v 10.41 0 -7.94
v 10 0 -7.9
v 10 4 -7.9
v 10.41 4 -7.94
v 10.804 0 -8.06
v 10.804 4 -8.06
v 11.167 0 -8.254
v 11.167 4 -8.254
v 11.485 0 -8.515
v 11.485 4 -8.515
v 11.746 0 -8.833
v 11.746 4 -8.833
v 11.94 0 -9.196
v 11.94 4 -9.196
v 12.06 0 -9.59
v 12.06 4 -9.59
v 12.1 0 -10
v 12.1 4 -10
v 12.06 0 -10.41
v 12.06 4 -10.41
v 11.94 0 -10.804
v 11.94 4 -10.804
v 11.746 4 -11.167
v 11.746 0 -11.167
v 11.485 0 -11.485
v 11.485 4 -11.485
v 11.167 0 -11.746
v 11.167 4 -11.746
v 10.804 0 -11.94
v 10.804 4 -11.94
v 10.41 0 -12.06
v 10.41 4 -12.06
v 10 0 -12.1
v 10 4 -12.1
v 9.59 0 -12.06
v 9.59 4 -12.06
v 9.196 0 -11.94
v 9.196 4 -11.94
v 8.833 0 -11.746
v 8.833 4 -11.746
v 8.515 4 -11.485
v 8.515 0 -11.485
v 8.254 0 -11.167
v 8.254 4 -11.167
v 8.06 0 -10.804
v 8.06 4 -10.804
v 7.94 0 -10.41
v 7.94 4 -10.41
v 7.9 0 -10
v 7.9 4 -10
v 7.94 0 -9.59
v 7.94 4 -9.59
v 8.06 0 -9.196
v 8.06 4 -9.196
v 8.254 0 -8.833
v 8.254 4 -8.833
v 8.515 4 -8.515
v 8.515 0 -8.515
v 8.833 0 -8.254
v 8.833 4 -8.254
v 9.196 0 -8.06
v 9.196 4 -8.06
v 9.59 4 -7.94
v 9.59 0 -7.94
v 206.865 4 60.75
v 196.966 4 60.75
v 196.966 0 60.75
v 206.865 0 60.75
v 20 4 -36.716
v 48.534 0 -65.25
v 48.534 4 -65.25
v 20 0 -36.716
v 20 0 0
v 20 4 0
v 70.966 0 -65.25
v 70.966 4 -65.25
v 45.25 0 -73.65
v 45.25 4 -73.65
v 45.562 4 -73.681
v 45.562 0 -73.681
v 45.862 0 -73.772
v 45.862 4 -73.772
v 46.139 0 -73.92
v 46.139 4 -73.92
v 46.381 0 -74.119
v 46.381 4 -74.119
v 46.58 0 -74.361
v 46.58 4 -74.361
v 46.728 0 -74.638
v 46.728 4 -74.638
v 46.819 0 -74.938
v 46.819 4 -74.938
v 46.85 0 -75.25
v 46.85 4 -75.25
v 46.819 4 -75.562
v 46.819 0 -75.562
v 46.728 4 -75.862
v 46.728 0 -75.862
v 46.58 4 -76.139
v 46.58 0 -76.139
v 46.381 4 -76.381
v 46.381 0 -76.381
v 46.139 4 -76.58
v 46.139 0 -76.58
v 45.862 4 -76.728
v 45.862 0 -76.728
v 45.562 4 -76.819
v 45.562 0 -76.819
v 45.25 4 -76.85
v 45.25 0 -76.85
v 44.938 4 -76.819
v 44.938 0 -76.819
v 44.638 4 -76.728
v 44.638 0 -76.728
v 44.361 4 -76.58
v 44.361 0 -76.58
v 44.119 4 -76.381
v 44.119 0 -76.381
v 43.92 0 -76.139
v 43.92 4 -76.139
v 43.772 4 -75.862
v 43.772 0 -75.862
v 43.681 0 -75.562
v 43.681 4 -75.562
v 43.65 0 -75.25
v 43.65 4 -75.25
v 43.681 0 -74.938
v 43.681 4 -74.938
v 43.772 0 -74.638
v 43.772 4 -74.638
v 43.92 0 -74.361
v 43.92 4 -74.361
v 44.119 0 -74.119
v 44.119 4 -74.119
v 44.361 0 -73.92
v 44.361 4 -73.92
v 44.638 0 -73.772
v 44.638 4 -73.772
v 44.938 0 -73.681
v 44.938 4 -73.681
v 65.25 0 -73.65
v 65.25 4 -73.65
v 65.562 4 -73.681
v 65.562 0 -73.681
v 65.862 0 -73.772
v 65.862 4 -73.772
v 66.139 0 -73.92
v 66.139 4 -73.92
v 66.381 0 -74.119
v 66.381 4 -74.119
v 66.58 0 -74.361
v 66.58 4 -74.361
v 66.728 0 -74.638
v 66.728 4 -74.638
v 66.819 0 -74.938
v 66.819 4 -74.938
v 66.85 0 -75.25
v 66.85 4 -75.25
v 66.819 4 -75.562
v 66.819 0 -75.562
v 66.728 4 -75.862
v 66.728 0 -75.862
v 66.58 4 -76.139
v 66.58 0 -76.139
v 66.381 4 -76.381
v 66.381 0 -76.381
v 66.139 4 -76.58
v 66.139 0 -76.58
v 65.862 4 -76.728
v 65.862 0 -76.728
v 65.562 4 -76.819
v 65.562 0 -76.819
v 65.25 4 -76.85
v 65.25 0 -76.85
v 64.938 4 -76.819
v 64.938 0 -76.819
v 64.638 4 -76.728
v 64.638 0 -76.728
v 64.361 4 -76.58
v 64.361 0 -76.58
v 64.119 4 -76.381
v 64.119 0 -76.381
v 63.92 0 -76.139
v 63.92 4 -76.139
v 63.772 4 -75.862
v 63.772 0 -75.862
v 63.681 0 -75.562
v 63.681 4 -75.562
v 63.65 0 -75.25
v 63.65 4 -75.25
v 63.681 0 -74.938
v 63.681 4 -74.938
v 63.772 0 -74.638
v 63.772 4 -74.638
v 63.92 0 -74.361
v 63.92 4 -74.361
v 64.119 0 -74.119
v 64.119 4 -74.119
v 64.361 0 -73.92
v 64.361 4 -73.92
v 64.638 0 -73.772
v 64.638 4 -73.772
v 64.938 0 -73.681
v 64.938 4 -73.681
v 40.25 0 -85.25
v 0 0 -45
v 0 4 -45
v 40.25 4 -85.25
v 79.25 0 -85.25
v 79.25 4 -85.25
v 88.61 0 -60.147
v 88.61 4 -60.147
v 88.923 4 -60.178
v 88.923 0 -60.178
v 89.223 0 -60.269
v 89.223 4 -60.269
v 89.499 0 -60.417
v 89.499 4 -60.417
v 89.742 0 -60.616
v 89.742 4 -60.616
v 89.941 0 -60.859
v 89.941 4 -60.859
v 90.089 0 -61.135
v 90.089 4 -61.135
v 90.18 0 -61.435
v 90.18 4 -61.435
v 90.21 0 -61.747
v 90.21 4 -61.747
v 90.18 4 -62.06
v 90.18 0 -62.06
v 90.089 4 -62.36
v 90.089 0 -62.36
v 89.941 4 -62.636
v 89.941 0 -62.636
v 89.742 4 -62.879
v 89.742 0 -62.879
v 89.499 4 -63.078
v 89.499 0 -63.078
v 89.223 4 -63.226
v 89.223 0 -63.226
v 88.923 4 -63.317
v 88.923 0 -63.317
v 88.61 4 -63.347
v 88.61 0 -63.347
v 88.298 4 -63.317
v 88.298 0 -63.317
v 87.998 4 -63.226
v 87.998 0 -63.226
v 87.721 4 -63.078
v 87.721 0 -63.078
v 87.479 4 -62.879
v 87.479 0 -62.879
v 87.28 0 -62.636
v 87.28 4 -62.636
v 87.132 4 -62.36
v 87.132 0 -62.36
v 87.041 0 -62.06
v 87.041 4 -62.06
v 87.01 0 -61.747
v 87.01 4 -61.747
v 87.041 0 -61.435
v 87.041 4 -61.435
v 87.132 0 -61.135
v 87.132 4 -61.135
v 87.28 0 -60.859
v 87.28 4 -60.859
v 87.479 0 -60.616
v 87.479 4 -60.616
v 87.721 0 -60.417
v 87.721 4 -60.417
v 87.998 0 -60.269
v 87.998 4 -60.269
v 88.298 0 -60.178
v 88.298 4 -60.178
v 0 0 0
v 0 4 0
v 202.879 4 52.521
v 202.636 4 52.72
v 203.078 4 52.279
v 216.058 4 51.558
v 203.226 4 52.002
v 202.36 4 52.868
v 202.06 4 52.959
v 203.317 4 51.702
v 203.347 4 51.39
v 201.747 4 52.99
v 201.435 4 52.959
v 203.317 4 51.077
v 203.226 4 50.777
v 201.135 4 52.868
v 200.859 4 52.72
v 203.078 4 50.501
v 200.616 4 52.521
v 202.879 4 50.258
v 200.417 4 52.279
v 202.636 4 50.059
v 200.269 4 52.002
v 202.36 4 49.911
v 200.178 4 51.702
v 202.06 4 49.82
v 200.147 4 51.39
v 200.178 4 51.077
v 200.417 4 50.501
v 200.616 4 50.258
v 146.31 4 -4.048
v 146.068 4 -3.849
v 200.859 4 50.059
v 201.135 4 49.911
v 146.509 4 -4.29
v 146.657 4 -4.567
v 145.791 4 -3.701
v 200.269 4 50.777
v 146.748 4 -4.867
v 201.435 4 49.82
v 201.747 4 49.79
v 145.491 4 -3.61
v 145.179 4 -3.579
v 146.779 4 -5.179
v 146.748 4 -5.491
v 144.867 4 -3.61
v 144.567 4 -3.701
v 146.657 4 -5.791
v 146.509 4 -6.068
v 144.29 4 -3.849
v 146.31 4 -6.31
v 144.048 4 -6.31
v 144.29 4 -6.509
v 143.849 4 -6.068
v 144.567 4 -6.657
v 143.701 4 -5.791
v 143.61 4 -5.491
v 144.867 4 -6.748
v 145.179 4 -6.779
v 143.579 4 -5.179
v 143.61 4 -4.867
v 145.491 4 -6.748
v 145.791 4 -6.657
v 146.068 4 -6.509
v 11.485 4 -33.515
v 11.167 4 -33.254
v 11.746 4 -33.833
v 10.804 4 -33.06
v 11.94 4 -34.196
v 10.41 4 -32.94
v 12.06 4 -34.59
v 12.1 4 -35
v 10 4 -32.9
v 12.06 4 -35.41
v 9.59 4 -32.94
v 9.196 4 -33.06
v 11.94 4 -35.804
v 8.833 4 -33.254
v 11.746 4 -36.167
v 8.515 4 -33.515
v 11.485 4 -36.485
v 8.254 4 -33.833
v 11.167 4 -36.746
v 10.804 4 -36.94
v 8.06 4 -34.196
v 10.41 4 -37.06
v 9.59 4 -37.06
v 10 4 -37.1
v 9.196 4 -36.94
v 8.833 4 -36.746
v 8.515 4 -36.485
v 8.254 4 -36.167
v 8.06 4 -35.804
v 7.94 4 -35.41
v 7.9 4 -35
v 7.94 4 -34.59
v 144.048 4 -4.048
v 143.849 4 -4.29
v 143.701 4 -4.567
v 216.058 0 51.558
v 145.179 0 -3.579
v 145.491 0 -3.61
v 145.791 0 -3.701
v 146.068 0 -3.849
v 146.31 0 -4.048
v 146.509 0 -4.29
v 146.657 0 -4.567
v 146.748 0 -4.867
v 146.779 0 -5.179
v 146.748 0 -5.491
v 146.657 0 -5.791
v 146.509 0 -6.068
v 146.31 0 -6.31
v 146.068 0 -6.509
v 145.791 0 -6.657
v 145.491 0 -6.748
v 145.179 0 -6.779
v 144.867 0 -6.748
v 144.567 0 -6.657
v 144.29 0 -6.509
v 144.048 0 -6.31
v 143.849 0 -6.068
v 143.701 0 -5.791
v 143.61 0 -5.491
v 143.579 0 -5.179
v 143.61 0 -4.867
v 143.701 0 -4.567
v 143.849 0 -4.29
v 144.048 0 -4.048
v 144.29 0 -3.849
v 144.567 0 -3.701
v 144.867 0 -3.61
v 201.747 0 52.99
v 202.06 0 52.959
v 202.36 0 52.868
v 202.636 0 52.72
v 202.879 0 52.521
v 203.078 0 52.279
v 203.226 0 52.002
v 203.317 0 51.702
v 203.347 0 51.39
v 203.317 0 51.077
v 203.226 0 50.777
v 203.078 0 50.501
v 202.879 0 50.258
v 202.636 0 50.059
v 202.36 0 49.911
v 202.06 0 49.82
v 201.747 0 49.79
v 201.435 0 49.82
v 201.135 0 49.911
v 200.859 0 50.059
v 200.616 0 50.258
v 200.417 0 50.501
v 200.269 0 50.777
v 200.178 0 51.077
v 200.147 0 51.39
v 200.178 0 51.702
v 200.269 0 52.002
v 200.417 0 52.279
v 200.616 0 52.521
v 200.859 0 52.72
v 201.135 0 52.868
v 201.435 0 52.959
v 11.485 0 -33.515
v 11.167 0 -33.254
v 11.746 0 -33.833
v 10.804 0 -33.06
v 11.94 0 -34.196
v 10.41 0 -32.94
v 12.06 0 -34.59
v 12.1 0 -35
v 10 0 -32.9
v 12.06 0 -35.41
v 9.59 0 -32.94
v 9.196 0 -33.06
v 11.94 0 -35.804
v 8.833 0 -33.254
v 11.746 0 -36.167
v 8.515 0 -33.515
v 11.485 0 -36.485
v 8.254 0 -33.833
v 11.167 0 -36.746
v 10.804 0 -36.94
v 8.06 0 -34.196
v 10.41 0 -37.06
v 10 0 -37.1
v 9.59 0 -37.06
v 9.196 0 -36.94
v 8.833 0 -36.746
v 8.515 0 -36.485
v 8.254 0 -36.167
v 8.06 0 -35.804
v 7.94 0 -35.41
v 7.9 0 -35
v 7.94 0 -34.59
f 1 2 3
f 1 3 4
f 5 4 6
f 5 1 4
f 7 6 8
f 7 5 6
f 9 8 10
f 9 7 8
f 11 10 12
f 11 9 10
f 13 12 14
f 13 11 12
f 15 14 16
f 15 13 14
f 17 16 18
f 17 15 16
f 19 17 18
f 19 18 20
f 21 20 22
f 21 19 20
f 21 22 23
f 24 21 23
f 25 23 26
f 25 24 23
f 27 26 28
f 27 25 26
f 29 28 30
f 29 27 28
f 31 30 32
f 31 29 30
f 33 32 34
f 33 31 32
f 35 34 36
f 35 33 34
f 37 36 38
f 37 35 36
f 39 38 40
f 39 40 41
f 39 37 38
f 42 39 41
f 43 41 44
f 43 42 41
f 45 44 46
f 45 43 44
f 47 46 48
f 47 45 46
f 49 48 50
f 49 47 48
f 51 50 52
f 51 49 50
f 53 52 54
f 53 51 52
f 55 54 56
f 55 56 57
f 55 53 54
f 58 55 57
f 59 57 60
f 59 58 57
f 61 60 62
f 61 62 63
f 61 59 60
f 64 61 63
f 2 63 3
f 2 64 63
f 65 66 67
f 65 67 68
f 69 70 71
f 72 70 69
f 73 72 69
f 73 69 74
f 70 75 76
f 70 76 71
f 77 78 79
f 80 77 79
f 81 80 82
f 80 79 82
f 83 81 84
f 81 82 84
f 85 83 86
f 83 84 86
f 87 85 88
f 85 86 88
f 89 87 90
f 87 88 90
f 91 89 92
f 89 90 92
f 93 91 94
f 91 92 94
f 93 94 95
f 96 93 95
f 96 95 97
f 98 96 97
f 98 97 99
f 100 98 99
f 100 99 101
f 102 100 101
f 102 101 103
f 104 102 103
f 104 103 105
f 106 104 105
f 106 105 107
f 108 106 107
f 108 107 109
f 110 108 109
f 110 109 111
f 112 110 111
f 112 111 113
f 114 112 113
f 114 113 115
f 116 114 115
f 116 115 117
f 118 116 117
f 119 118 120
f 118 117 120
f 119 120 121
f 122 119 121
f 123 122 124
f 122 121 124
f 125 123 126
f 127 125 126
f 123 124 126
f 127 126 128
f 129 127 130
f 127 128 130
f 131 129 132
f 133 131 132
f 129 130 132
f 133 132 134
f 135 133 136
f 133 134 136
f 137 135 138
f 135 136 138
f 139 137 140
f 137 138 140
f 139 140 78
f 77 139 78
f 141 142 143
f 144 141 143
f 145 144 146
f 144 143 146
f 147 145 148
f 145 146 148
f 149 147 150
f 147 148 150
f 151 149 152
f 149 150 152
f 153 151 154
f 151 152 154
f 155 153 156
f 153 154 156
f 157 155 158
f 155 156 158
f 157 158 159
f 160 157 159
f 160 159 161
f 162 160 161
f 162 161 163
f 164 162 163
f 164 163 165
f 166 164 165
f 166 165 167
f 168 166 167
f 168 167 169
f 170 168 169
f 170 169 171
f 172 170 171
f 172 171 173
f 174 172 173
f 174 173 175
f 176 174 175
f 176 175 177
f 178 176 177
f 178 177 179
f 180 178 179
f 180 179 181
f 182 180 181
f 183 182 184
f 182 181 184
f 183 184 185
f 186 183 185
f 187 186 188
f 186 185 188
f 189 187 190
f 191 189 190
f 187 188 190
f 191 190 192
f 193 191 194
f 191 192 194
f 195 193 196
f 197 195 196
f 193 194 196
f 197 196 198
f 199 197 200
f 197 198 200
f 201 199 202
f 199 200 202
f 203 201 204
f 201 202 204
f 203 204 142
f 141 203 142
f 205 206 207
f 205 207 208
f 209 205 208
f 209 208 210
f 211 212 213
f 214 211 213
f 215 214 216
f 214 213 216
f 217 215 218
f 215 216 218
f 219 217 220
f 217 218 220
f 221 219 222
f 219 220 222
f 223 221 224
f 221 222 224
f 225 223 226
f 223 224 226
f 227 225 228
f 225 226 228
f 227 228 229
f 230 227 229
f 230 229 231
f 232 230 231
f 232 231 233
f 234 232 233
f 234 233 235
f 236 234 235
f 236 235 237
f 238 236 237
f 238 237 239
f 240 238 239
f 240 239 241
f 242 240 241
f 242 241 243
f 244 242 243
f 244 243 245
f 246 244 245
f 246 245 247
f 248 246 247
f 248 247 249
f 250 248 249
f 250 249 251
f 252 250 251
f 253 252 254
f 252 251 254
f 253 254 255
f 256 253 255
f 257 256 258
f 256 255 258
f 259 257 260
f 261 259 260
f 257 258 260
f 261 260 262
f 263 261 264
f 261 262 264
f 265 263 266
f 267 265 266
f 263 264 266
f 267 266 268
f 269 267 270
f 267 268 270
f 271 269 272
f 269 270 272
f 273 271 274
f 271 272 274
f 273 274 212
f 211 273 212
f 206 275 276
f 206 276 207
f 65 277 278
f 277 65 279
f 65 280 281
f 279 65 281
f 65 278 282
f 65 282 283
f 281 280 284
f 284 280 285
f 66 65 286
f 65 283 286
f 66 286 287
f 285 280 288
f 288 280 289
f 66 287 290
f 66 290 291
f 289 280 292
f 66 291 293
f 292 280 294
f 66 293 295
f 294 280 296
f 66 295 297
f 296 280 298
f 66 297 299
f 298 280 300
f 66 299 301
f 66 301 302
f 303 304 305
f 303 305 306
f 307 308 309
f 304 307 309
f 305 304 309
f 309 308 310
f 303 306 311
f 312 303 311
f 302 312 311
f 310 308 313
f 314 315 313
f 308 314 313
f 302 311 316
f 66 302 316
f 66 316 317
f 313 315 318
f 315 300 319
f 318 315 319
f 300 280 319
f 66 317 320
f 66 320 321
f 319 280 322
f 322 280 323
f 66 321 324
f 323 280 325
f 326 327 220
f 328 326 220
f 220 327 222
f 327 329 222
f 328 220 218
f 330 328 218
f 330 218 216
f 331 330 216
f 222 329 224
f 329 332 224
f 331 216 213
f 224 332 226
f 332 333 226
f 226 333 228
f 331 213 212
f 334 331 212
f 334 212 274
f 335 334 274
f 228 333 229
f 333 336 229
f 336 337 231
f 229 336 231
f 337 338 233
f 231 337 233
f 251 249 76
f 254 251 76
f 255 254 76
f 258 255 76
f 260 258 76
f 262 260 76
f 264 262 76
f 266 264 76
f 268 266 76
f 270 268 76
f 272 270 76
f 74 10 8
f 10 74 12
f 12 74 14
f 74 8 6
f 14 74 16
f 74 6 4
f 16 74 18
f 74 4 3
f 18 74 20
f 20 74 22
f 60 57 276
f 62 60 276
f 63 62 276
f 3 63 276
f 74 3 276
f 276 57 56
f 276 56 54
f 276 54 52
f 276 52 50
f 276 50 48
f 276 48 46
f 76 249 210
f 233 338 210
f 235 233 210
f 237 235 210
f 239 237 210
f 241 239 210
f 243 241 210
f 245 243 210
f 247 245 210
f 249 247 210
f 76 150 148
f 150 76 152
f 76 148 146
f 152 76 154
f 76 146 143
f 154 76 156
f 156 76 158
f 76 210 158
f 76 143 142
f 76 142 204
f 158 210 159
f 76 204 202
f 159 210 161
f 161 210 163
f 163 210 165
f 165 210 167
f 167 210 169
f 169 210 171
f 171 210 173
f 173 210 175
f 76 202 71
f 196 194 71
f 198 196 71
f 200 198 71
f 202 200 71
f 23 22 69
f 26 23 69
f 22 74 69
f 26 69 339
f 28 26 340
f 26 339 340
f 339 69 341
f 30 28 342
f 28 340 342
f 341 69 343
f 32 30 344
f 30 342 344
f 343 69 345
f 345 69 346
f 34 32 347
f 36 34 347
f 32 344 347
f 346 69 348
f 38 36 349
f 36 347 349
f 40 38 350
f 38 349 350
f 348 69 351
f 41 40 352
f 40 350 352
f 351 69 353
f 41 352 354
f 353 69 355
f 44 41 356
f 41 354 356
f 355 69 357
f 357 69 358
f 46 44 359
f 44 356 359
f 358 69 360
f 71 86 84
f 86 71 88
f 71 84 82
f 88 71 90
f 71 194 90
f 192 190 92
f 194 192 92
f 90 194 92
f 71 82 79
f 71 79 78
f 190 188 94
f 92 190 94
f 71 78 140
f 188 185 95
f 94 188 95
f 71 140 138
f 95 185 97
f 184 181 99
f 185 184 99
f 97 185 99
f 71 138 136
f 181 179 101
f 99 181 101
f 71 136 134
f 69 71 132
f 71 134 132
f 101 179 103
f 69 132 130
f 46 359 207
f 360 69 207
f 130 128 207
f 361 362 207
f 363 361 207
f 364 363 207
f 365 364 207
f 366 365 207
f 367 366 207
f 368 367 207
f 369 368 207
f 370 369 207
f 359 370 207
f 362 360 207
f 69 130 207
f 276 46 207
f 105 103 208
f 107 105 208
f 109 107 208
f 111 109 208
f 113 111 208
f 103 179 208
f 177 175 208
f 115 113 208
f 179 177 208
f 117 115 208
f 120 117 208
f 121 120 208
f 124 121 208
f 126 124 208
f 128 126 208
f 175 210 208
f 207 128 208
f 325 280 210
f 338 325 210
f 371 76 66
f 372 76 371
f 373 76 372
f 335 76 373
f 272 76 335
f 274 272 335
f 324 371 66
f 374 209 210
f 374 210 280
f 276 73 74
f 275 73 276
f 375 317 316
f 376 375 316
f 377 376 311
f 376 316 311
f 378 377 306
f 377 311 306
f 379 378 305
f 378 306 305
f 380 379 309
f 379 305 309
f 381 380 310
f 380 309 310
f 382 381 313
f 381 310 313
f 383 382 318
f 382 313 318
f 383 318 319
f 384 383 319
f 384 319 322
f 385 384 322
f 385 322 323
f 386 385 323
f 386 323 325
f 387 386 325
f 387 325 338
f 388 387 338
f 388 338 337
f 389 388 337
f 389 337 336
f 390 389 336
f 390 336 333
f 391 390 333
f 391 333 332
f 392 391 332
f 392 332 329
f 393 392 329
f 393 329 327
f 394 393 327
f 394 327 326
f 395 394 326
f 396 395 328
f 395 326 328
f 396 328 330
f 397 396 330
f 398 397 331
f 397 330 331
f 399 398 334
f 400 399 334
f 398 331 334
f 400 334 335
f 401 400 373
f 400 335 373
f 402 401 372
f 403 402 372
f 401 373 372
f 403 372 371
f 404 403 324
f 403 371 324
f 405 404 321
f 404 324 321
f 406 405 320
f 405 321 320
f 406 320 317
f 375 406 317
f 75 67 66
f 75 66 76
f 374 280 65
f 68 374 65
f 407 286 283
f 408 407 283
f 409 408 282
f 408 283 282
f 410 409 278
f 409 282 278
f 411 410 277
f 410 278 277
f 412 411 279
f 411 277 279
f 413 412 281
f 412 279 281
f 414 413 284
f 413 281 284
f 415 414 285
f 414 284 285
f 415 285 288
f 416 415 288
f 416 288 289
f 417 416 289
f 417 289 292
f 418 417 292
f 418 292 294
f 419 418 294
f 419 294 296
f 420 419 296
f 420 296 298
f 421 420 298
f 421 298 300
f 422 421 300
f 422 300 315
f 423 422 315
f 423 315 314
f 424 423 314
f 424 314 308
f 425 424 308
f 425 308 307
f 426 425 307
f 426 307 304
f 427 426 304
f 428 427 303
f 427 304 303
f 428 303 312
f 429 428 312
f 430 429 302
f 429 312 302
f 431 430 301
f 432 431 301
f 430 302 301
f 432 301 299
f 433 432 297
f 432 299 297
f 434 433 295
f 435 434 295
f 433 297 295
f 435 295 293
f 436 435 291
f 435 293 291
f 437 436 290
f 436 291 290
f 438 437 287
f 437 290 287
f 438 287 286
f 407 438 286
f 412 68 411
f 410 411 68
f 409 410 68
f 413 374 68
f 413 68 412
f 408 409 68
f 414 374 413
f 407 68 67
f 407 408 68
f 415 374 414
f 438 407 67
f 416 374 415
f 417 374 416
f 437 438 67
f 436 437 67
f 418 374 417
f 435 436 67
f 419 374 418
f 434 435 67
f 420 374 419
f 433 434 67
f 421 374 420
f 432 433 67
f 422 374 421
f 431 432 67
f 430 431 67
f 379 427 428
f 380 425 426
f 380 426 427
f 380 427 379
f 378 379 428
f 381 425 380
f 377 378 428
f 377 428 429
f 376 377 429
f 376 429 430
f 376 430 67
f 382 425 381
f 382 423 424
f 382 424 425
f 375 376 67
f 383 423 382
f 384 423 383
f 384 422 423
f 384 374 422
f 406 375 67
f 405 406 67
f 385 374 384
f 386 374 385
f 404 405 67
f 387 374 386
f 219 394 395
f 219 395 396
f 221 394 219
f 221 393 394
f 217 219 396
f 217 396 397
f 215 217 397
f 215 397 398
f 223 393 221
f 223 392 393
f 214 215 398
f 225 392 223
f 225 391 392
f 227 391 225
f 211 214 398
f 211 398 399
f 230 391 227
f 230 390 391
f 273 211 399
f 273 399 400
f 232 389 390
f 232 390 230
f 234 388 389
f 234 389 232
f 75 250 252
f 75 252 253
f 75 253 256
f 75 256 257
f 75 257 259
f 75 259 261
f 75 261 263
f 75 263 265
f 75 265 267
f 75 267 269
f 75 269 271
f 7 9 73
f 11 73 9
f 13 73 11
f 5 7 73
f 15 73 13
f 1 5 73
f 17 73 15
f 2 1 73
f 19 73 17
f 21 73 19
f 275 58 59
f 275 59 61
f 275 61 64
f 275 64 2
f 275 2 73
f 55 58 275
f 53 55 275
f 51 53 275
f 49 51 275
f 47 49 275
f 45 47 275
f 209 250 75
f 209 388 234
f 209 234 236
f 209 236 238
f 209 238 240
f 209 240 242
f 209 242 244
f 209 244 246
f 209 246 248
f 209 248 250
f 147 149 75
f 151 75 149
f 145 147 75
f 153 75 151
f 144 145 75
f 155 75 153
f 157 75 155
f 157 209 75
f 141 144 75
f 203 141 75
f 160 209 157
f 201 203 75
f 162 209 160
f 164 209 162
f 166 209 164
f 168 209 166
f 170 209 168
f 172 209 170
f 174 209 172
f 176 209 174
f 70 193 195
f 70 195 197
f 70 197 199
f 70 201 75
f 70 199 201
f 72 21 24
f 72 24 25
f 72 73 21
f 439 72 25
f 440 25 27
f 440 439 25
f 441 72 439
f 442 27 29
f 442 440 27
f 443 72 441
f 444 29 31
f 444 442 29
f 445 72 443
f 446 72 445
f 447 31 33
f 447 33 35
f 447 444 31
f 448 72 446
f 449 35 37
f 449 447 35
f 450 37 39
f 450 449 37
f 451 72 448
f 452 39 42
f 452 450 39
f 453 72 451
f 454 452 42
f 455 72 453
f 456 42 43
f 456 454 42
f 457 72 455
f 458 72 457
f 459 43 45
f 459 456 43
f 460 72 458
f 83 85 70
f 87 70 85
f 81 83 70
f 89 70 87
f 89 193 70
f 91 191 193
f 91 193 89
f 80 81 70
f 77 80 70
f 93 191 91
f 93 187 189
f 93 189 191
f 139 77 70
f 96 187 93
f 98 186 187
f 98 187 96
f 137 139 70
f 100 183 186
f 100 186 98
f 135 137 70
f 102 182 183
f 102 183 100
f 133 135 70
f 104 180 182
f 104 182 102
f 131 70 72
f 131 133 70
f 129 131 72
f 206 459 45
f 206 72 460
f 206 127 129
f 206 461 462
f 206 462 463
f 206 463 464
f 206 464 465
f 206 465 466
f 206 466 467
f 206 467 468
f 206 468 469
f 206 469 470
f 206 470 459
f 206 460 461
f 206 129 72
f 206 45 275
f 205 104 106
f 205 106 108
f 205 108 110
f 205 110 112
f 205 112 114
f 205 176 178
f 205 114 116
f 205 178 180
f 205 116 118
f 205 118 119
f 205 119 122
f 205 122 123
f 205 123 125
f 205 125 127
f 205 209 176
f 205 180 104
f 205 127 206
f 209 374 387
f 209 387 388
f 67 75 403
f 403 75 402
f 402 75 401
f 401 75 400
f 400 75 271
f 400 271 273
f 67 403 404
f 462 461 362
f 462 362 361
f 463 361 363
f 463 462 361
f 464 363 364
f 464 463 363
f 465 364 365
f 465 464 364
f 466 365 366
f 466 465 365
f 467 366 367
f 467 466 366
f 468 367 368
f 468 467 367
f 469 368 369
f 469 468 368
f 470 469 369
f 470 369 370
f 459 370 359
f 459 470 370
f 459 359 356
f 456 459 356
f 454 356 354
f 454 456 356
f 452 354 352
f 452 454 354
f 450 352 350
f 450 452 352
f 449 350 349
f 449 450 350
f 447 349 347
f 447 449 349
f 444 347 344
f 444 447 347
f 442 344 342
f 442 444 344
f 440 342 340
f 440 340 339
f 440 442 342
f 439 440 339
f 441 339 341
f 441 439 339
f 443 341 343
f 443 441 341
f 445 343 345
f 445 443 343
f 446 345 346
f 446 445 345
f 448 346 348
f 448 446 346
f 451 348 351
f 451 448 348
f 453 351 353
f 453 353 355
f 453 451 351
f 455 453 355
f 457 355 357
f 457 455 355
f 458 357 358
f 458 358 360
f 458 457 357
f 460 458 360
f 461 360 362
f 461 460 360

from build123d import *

# Parameters (mm, degrees)
SKETCH_1_R          = 2.1
EXTRUDE_1_DEPTH     = 4
CUT_EXTRUDE_1_DEPTH = 10
SKETCH_3_R          = 1.6
CUT_EXTRUDE_2_DEPTH = 50
CUT_EXTRUDE_3_DEPTH = 50
SKETCH_5_R          = 1.6
CUT_EXTRUDE_4_DEPTH = 50


with BuildPart() as part:
    # 草图1 → 凸台-拉伸1 (new body)
    with BuildSketch(Plane(origin=(0, 0, 0), x_dir=(1, 0, 0), z_dir=(0, 1, 0))):
        Polygon((20, 0), (0, 0), (0, 45), (40.25, 85.25), (79.25, 85.25), (225.25, -60.75), (225.25, -99.75), (185, -140), (140, -140), (140, -120), (176.715728753, -120), (205.25, -91.465728753), (205.25, -69.034271247), (70.965728753, 65.25), (48.534271247, 65.25), (20, 36.715728753), align=None)
        with Locations(Location((10, 10, 0), (0, 0, 270))):
            Circle(SKETCH_1_R, mode=Mode.SUBTRACT)
        with Locations(Location((10, 35, 0), (0, 0, 90))):
            Circle(SKETCH_1_R, mode=Mode.SUBTRACT)
        with Locations(Location((175, -130, 0), (0, 0, 270))):
            Circle(SKETCH_1_R, mode=Mode.SUBTRACT)
        with Locations(Location((150, -130, 0), (0, 0, 90))):
            Circle(SKETCH_1_R, mode=Mode.SUBTRACT)
    extrude(amount=EXTRUDE_1_DEPTH)

    # 草图2 → 切除-拉伸1 (cut)
    with BuildSketch(Plane(origin=(0, 4, 0), x_dir=(1, 0, 0), z_dir=(0, 1, 0))):
        Polygon((225.25, -60.75), (225.25, -99.75), (185, -140), (140, -140), (140, -120), (176.715728753, -120), (205.25, -91.465728753), (205.25, -69.034271247), (196.965728753, -60.75), align=None)
    extrude(amount=-CUT_EXTRUDE_1_DEPTH, mode=Mode.SUBTRACT)

    # 草图3 → 切除-拉伸2 (cut)
    with BuildSketch(Plane(origin=(0, 4, 0), x_dir=(1, 0, 0), z_dir=(0, 1, 0))):
        with Locations(Location((201.747474683, -51.389610307, 0), (0, 0, 270))):
            Circle(SKETCH_3_R)
        with Locations(Location((88.610389693, 61.747474683, 0), (0, 0, 270))):
            Circle(SKETCH_3_R)
        with Locations(Location((145.178932188, 5.178932188, 0), (0, 0, 270))):
            Circle(SKETCH_3_R)
    extrude(amount=-CUT_EXTRUDE_2_DEPTH, mode=Mode.SUBTRACT)

    # 草图4 → 切除-拉伸3 (cut)
    with BuildSketch(Plane(origin=(0, 4, 0), x_dir=(1, 0, 0), z_dir=(0, 1, 0))):
        Polygon((225.25, -60.75), (216.057611845, -51.557611845), (206.865223689, -60.75), align=None)
    extrude(amount=-CUT_EXTRUDE_3_DEPTH, mode=Mode.SUBTRACT)

    # 草图5 → 切除-拉伸4 (cut)
    with BuildSketch(Plane(origin=(0, 4, 0), x_dir=(1, 0, 0), z_dir=(0, 1, 0))):
        with Locations(Location((65.25, 75.25, 0), (0, 0, 270))):
            Circle(SKETCH_5_R)
        with Locations(Location((45.25, 75.25, 0), (0, 0, 270))):
            Circle(SKETCH_5_R)
    extrude(amount=-CUT_EXTRUDE_4_DEPTH, mode=Mode.SUBTRACT)


solid = part.part
